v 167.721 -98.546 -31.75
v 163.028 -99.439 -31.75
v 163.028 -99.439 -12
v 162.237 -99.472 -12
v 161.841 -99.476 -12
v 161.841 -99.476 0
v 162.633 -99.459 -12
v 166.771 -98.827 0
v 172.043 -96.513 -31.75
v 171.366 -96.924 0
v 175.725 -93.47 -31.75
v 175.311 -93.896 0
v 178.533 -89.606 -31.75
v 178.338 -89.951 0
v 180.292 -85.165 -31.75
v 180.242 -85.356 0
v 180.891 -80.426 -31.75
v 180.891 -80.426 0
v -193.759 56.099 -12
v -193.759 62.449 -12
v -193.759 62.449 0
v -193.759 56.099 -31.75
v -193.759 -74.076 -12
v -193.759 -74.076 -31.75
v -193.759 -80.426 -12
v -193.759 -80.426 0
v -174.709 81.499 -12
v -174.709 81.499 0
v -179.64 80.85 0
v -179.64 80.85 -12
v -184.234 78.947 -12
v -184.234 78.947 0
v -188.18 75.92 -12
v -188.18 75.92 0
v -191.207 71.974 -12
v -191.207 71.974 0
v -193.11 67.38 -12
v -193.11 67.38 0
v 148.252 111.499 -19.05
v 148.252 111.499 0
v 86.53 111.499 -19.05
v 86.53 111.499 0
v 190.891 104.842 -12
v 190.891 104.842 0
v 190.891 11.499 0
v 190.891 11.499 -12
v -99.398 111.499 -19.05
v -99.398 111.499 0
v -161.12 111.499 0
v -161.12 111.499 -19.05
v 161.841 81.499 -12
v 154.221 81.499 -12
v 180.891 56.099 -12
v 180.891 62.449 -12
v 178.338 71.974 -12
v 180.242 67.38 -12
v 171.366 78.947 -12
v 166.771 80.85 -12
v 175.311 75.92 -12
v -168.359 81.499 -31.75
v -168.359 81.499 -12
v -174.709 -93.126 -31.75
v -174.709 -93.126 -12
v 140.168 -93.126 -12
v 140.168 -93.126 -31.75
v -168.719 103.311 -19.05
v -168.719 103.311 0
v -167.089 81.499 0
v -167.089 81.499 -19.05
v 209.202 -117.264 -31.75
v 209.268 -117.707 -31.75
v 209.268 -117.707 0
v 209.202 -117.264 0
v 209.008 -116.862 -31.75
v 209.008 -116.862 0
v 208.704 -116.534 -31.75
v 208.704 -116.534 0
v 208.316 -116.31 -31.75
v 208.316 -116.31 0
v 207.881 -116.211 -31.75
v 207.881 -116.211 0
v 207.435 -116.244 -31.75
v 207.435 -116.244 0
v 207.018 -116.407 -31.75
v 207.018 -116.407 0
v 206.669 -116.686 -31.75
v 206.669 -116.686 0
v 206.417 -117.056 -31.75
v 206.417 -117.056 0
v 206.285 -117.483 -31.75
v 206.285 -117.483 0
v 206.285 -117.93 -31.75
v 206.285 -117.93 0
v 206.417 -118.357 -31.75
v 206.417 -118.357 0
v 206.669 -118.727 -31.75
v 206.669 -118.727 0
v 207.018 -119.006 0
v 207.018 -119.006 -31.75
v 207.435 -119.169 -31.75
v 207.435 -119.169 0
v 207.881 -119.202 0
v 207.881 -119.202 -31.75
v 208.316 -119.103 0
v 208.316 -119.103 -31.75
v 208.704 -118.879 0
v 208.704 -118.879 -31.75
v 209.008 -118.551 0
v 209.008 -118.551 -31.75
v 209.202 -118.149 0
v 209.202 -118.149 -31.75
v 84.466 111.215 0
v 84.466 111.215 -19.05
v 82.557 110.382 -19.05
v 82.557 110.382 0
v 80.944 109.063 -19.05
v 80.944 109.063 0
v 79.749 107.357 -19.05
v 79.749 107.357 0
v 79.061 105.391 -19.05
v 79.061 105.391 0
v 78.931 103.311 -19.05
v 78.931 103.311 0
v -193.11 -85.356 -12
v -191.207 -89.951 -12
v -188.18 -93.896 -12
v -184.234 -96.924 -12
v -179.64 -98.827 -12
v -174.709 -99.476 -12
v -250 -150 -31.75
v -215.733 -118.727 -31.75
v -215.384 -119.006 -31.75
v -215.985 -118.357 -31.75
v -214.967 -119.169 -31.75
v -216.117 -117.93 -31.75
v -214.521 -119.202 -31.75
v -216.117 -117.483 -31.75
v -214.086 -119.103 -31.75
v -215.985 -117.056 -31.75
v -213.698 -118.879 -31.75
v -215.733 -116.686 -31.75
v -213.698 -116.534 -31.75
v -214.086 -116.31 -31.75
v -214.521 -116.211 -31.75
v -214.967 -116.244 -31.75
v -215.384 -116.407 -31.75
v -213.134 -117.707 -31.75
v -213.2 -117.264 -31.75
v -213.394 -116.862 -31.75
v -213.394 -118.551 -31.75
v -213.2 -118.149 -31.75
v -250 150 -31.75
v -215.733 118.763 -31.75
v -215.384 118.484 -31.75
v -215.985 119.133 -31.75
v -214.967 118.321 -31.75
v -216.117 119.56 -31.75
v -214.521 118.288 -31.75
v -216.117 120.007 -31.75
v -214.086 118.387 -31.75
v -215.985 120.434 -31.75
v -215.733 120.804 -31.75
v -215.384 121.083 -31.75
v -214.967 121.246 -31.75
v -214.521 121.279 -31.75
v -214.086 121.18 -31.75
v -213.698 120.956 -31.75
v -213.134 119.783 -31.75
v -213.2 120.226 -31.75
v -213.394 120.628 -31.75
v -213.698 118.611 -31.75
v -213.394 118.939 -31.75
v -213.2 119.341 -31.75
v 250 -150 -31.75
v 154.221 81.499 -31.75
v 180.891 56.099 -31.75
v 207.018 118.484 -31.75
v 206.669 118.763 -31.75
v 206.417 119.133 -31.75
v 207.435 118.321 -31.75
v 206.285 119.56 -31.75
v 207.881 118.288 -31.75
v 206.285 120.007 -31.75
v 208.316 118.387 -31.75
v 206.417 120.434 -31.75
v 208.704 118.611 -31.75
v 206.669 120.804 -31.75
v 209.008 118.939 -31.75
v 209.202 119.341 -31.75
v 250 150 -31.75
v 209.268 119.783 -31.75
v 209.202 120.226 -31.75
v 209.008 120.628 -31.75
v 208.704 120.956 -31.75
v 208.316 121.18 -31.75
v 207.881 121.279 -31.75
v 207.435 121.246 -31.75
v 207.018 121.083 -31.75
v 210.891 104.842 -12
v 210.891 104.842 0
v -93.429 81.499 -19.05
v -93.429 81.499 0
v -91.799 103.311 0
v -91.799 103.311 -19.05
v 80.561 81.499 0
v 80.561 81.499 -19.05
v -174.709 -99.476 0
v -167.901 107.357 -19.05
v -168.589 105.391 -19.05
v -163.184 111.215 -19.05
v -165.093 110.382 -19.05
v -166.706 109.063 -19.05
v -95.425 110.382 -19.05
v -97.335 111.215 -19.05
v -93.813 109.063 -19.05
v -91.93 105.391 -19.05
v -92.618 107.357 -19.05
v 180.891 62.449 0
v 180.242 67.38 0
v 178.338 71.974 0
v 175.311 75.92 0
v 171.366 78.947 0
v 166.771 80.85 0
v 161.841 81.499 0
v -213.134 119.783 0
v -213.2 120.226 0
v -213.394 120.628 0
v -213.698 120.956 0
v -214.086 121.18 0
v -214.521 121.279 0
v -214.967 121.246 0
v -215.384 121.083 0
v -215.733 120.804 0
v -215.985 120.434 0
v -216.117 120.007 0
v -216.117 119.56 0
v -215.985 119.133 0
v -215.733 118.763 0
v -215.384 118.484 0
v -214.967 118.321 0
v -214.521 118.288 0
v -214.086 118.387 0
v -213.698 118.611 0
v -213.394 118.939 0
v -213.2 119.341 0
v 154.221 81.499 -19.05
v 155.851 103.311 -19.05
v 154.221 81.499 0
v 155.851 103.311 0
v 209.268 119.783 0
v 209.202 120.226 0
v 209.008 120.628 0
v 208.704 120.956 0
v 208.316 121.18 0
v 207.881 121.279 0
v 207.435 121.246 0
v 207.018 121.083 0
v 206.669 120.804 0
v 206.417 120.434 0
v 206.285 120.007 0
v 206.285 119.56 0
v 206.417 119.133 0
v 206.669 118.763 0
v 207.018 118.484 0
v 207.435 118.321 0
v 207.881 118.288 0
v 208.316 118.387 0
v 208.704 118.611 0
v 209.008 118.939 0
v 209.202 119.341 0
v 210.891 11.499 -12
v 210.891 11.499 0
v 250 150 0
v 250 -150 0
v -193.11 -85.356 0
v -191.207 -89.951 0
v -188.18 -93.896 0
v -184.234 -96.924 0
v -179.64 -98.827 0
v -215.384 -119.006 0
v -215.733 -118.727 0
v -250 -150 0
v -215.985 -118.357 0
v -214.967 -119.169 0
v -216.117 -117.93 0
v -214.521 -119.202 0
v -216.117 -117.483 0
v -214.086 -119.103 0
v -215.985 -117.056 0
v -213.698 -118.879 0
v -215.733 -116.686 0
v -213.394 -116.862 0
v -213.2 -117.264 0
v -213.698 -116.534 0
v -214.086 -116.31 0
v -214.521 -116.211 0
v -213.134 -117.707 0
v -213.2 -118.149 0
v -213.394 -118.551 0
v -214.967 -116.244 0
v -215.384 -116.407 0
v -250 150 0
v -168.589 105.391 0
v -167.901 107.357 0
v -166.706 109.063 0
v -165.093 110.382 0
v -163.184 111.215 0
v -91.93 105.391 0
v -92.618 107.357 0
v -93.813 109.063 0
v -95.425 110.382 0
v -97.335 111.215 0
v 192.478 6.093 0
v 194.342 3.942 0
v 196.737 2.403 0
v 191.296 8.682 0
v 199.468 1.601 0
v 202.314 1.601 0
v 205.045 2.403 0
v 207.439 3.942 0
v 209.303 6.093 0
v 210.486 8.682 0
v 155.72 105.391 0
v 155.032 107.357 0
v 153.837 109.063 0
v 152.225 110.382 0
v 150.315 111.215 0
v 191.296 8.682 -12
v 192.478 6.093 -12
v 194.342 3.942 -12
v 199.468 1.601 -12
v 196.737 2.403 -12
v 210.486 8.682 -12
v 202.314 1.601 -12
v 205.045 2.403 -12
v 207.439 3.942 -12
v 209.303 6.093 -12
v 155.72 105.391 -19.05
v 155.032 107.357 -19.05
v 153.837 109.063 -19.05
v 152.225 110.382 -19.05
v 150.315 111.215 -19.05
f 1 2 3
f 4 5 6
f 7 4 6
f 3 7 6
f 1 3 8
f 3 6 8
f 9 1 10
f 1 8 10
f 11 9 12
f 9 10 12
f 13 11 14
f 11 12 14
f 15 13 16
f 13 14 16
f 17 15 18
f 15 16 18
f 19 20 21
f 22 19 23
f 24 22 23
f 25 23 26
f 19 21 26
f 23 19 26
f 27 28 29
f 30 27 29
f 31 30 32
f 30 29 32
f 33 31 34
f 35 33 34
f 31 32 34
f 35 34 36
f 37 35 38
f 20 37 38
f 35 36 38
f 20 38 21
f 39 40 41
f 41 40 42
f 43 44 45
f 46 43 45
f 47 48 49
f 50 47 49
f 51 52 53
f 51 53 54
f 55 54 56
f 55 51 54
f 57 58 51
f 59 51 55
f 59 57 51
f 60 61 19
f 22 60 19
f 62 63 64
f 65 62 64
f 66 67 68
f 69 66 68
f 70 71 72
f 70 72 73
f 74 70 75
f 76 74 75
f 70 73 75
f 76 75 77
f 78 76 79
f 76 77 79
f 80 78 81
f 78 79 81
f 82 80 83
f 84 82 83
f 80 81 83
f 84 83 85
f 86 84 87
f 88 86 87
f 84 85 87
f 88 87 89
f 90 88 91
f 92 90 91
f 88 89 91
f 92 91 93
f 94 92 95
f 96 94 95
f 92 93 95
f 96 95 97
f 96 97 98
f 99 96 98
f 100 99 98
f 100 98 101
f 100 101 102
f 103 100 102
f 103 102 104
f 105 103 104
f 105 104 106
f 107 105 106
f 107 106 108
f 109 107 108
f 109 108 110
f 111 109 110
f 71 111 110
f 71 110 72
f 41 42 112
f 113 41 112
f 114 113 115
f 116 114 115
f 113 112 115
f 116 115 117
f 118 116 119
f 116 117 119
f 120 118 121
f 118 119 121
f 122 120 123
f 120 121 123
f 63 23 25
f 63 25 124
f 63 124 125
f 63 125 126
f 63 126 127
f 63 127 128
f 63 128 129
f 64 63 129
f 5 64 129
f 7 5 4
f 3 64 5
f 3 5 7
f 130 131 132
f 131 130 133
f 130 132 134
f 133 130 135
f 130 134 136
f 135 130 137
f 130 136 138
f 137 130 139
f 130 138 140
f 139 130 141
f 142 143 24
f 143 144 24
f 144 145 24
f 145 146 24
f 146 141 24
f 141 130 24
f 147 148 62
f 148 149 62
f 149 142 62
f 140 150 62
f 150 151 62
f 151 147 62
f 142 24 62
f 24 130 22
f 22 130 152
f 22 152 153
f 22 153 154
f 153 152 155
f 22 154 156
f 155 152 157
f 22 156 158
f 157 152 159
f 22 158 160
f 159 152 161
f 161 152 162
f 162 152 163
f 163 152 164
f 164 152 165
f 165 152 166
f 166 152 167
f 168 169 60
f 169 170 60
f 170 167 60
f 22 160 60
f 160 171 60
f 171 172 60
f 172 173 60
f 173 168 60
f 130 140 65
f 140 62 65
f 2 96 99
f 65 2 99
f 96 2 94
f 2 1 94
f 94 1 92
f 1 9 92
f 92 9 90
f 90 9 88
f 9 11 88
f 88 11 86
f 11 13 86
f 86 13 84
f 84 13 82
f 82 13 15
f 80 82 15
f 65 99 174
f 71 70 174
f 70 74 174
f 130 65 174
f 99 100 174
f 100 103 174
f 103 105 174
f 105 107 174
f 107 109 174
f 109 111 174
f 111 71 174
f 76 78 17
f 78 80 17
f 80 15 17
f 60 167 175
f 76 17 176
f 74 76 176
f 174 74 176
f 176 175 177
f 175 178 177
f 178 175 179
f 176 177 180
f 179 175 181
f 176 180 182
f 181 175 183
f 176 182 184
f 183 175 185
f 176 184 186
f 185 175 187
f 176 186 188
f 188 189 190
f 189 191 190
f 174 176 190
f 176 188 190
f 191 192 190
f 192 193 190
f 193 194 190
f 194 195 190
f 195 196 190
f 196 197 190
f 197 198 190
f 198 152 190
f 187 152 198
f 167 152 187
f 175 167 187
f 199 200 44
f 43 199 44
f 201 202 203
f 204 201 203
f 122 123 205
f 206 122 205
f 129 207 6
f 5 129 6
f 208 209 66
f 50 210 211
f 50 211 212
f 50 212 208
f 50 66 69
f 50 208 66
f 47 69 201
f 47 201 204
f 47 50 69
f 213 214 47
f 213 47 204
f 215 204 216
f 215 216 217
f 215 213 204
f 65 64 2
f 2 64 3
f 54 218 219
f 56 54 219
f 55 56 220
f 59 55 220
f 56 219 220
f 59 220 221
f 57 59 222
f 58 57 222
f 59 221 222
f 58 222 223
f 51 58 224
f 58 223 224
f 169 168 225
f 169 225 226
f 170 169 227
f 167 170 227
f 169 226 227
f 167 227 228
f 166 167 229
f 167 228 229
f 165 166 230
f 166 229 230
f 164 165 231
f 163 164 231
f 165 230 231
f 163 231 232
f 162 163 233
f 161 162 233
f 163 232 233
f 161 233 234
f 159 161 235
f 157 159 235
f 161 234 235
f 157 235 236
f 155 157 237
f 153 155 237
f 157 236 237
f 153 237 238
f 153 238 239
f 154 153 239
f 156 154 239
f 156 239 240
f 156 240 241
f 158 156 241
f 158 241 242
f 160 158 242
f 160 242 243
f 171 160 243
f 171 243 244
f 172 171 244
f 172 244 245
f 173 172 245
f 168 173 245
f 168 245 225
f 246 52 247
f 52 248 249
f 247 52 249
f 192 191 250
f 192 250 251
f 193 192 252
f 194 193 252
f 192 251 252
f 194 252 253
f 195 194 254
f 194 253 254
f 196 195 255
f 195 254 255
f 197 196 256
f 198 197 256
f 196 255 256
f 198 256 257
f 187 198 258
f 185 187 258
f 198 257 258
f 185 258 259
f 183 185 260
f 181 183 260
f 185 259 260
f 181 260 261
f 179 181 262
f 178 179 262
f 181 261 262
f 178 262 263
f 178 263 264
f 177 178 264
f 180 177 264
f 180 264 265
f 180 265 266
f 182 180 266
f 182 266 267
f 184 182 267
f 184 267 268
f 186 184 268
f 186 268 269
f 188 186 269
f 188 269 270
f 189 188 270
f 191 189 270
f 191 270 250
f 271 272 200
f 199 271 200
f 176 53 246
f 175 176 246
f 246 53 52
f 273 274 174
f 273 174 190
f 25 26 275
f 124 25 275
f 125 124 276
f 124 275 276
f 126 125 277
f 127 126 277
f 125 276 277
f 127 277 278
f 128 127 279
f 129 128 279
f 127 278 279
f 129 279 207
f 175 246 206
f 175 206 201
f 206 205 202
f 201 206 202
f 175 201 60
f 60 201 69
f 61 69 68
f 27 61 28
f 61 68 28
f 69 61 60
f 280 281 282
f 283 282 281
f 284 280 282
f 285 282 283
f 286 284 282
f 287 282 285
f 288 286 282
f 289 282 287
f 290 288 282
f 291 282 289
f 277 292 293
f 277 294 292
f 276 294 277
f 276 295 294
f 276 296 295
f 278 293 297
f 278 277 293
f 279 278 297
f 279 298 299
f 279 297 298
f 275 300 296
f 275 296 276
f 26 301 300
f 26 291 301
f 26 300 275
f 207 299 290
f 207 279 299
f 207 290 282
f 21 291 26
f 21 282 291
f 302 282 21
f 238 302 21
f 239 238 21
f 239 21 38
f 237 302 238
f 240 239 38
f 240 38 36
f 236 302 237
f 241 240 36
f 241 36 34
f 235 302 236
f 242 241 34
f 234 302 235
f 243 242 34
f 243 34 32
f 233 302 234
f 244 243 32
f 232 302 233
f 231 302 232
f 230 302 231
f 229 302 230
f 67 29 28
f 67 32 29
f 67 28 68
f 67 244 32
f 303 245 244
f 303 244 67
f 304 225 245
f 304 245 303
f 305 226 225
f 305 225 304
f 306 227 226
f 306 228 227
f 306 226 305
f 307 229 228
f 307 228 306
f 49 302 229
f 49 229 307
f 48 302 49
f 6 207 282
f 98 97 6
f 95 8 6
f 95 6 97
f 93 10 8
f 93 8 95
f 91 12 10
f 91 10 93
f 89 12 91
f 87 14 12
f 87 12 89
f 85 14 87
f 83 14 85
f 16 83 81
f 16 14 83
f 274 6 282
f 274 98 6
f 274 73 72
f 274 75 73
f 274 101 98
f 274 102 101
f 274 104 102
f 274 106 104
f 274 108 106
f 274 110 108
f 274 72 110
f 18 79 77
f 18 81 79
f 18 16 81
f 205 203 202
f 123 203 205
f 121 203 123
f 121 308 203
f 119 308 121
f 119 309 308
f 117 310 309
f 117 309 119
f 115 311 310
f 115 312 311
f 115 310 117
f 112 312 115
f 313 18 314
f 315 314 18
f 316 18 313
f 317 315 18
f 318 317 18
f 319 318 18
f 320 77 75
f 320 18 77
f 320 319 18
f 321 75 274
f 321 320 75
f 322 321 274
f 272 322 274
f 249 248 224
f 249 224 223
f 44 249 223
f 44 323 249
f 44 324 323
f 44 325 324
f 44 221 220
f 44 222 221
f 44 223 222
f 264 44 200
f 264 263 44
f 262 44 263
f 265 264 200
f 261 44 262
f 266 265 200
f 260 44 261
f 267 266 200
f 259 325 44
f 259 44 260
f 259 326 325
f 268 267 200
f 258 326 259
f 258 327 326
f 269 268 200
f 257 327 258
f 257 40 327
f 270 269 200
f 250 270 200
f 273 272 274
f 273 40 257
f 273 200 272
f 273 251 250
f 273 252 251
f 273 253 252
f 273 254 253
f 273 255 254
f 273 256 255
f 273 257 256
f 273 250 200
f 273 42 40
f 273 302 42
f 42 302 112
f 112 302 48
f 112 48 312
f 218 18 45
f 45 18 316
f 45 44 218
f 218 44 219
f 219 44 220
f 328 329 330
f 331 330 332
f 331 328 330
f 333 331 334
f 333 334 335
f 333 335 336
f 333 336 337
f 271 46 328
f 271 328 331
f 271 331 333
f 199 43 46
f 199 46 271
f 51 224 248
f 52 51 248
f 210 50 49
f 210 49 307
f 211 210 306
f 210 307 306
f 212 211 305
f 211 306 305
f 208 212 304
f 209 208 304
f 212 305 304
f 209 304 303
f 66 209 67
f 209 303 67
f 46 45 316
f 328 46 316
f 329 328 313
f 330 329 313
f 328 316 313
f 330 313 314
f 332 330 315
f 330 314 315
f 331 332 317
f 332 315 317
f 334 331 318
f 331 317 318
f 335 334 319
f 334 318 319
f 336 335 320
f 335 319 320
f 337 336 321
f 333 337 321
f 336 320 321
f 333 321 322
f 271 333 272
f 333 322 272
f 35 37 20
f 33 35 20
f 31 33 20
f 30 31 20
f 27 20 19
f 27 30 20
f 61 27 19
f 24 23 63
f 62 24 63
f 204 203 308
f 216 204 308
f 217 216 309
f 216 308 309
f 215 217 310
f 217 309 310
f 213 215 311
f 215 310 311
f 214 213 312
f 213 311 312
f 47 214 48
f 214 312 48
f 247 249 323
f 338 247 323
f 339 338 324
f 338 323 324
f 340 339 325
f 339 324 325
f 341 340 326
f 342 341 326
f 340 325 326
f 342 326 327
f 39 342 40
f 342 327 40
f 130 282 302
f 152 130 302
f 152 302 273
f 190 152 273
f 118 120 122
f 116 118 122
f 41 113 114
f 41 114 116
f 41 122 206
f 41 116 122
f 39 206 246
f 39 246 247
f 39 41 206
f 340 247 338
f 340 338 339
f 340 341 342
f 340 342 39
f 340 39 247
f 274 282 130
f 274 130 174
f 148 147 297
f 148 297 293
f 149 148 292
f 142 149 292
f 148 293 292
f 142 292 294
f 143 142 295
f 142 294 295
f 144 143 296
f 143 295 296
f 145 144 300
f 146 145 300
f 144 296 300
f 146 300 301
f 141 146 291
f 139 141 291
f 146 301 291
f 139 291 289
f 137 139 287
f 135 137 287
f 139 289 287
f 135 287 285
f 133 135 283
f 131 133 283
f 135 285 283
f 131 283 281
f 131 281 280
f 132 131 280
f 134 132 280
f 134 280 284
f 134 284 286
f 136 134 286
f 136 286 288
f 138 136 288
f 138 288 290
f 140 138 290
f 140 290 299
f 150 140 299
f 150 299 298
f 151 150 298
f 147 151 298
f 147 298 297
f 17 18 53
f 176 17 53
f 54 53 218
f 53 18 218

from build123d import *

# Parameters (mm, degrees)
F0_W     = 500
F0_H     = 300
F1_DEPTH = 31.75
F2_R     = 1.5
F3_DEPTH = 31.751
F5_DEPTH = 12
F8_DEPTH = 31.751
F9_DEPTH = 19.05


# Not quite as in the source:
# - a length typed as a fraction of an inch, garbled in the dataset ("3 / 203.2 mm" for 3/8 in), is restored


with BuildPart() as f1:
    # F0 (on Top) → F1 (new body)
    with BuildSketch(Plane.XY):
        Rectangle(F0_W, F0_H)
    extrude(amount=-F1_DEPTH)

    # F2 (on Top) → F3 (cut, through all)
    with BuildSketch(Plane.XY):
        with Locations((-214.6335691214, 119.7834908962)):
            Circle(F2_R)
        with Locations((-214.6335691214, -117.7065091038)):
            Circle(F2_R)
        with Locations((207.7684308786, 119.7834908962)):
            Circle(F2_R)
        with Locations((207.7684308786, -117.7065091038)):
            Circle(F2_R)
        with Locations((630.1704308786, 119.7834908962)):
            Circle(F2_R)
        with Locations((630.1704308786, -117.7065091038)):
            Circle(F2_R)
    extrude(amount=-F3_DEPTH, mode=Mode.SUBTRACT)

    # F4 (on Top) → F5 (cut)
    with BuildSketch(Plane.XY):
        with BuildLine():
            ThreePointArc((-193.759300375, -80.4257169581), (-188.1796845566, -93.8961011397), (-174.709300375, -99.4757169581))
            Line((-174.709300375, -99.4757169581), (161.840699625, -99.4757169581))
            ThreePointArc((161.840699625, -99.4757169581), (175.3110838066, -93.8961011397), (180.890699625, -80.4257169581))
            Line((180.890699625, -80.4257169581), (180.890699625, 62.4492830419))
            ThreePointArc((180.890699625, 62.4492830419), (175.3110838066, 75.9196672235), (161.840699625, 81.4992830419))
            Line((161.840699625, 81.4992830419), (-174.709300375, 81.4992830419))
            ThreePointArc((-174.709300375, 81.4992830419), (-188.1796845566, 75.9196672235), (-193.759300375, 62.4492830419))
            Line((-193.759300375, 62.4492830419), (-193.759300375, -80.4257169581))
        make_face()
        with BuildLine():
            Line((210.890699625, 104.8424765468), (190.890699625, 104.8424765468))
            Line((190.890699625, 104.8424765468), (190.890699625, 11.4992830419))
            ThreePointArc((190.890699625, 11.4992830419), (200.890699625, 1.4992830419), (210.890699625, 11.4992830419))
            Line((210.890699625, 11.4992830419), (210.890699625, 104.8424765468))
        make_face()
    extrude(amount=-F5_DEPTH, mode=Mode.SUBTRACT)

    # F7 (on face) → F8 (cut, through all)
    with BuildSketch(Plane.XY):
        with BuildLine():
            Line((-174.709300375, -93.1257169581), (140.1676505526, -93.1257169581))
            Line((140.1676505526, -93.1257169581), (163.0281784434, -99.438670281))
            ThreePointArc((163.0281784434, -99.438670281), (175.7245746513, -93.4695091312), (180.890699625, -80.4257169581))
            Line((180.890699625, -80.4257169581), (180.890699625, 56.0992830419))
            Line((180.890699625, 56.0992830419), (154.220699625, 81.4992830419))
            Line((154.220699625, 81.4992830419), (-168.359300375, 81.4992830419))
            Line((-168.359300375, 81.4992830419), (-187.409300375, 62.4492830419))
            Line((-187.409300375, 62.4492830419), (-193.759300375, 56.0992830419))
            Line((-193.759300375, 56.0992830419), (-193.759300375, -74.0757169581))
            Line((-193.759300375, -74.0757169581), (-174.709300375, -93.1257169581))
        make_face()
    extrude(amount=-F8_DEPTH, mode=Mode.SUBTRACT)

    # F6 (on Top) → F9 (cut)
    with BuildSketch(Plane.XY):
        with BuildLine():
            ThreePointArc((-161.120300375, 111.4992830419), (-166.7055905698, 109.0628082362), (-168.7191172889, 103.3114965432))
            Line((-168.7191172889, 103.3114965432), (-167.089300375, 81.4992830419))
            Line((-167.089300375, 81.4992830419), (-93.429300375, 81.4992830419))
            Line((-93.429300375, 81.4992830419), (-91.799483461, 103.3114965432))
            ThreePointArc((-91.799483461, 103.3114965432), (-93.8130101802, 109.0628082362), (-99.398300375, 111.4992830419))
            Line((-99.398300375, 111.4992830419), (-161.120300375, 111.4992830419))
        make_face()
        with BuildLine():
            Line((148.251699625, 111.4992830419), (86.529699625, 111.4992830419))
            ThreePointArc((86.529699625, 111.4992830419), (80.9444094302, 109.0628082362), (78.9308827111, 103.3114965432))
            Line((78.9308827111, 103.3114965432), (80.560699625, 81.4992830419))
            Line((80.560699625, 81.4992830419), (154.220699625, 81.4992830419))
            Line((154.220699625, 81.4992830419), (155.850516539, 103.3114965432))
            ThreePointArc((155.850516539, 103.3114965432), (153.8369898198, 109.0628082362), (148.251699625, 111.4992830419))
        make_face()
    extrude(amount=-F9_DEPTH, mode=Mode.SUBTRACT)


solid = f1.part
